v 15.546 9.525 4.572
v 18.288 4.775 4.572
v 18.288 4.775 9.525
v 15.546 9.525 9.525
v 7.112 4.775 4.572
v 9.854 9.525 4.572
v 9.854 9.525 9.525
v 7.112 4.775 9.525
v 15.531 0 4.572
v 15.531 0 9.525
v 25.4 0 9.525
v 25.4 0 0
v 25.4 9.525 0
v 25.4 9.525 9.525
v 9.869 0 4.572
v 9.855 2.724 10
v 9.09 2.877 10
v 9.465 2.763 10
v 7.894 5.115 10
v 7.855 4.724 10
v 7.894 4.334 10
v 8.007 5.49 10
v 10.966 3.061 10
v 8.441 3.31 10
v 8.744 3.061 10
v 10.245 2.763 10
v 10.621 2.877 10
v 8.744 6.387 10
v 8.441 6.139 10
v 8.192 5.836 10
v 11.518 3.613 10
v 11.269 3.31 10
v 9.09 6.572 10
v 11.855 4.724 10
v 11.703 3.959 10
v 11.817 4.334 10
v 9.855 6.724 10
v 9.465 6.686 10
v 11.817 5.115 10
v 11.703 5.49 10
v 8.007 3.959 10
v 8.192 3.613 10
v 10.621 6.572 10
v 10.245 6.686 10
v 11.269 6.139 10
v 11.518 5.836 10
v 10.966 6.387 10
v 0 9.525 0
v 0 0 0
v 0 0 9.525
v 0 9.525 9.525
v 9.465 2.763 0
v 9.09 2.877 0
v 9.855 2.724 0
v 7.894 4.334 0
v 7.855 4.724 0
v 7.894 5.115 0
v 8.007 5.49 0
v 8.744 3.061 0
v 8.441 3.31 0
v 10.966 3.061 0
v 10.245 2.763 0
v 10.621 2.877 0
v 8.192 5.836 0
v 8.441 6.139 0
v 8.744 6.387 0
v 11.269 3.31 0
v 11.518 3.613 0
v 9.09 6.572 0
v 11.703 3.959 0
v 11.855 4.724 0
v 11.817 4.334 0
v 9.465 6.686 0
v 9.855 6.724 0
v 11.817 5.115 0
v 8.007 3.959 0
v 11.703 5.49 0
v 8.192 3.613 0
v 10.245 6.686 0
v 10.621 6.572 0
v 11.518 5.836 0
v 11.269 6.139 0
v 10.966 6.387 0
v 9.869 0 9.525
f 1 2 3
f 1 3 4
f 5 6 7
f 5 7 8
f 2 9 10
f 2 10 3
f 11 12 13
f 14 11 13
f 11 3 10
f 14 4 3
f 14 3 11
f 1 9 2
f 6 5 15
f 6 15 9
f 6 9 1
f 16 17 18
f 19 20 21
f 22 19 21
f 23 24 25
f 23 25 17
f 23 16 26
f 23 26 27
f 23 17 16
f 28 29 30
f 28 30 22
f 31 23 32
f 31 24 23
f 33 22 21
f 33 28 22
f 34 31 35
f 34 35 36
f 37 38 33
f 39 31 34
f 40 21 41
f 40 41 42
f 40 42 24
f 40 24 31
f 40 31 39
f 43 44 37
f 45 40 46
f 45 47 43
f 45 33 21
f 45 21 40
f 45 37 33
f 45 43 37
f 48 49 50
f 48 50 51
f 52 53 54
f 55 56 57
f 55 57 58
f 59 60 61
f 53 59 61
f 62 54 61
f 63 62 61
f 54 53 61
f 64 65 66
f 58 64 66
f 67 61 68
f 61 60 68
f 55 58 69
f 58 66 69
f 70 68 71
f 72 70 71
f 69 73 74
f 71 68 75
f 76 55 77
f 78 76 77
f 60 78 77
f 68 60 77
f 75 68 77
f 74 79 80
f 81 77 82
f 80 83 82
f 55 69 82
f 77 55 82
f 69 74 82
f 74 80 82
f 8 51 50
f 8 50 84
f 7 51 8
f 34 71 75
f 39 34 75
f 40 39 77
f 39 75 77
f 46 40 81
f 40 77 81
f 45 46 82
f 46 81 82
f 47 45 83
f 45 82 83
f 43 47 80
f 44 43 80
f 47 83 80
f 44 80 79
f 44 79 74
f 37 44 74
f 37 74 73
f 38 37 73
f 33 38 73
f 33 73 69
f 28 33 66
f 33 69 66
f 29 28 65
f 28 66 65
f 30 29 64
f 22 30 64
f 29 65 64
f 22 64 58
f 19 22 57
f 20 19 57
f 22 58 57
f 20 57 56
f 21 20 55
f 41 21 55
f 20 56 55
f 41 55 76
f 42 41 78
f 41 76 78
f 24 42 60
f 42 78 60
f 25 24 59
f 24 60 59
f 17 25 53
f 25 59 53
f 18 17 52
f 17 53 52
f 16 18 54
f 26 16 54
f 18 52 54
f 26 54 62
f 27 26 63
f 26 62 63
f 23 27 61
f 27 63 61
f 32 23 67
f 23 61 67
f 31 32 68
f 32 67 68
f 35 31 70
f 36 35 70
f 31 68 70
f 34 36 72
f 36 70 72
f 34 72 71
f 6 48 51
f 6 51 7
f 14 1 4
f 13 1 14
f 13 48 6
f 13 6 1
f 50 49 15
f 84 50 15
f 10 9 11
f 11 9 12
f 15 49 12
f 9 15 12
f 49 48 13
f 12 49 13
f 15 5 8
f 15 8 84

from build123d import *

# Parameters (mm, degrees)
EXTRUDE_DEPTH  = 5.08
BOX_W          = 25.4
BOX_H          = 9.525
BOX_DEPTH      = 9.525
CYLINDER_R     = 2
CYLINDER_DEPTH = 10


with BuildPart() as extrude_body:
    # RegularPolygon → Extrude (new body)
    with BuildSketch(Plane(origin=(0, 0, 0), x_dir=(0, 1, 0), z_dir=(0, 0, 1))):
        Polygon((0, -5.588), (4.83935, -2.794), (4.83935, 2.794), (0, 5.588), (-4.83935, 2.794), (-4.83935, -2.794), align=None)
    extrude(amount=EXTRUDE_DEPTH)


with BuildPart() as extrude_body_1:
    # Extrude placement: moved
    add(extrude_body.part.moved(Location((12.7, 4.7752, 4.572))))


with BuildPart() as cut:
    # Box → Box (new body)
    with BuildSketch(Plane.XY):
        with Locations((12.7, 4.7625)):
            Rectangle(BOX_W, BOX_H)
    extrude(amount=BOX_DEPTH)

    # Cut: cut Extrude body
    add(extrude_body_1.part, mode=Mode.SUBTRACT)


with BuildPart() as cylinder:
    # Cylinder → Cylinder (new body)
    with BuildSketch(Plane(origin=(9.8552, 4.7244, 0), x_dir=(1, 0, 0), z_dir=(0, 0, 1))):
        Circle(CYLINDER_R)
    extrude(amount=CYLINDER_DEPTH)


solid = Compound([cut.part, cylinder.part])
